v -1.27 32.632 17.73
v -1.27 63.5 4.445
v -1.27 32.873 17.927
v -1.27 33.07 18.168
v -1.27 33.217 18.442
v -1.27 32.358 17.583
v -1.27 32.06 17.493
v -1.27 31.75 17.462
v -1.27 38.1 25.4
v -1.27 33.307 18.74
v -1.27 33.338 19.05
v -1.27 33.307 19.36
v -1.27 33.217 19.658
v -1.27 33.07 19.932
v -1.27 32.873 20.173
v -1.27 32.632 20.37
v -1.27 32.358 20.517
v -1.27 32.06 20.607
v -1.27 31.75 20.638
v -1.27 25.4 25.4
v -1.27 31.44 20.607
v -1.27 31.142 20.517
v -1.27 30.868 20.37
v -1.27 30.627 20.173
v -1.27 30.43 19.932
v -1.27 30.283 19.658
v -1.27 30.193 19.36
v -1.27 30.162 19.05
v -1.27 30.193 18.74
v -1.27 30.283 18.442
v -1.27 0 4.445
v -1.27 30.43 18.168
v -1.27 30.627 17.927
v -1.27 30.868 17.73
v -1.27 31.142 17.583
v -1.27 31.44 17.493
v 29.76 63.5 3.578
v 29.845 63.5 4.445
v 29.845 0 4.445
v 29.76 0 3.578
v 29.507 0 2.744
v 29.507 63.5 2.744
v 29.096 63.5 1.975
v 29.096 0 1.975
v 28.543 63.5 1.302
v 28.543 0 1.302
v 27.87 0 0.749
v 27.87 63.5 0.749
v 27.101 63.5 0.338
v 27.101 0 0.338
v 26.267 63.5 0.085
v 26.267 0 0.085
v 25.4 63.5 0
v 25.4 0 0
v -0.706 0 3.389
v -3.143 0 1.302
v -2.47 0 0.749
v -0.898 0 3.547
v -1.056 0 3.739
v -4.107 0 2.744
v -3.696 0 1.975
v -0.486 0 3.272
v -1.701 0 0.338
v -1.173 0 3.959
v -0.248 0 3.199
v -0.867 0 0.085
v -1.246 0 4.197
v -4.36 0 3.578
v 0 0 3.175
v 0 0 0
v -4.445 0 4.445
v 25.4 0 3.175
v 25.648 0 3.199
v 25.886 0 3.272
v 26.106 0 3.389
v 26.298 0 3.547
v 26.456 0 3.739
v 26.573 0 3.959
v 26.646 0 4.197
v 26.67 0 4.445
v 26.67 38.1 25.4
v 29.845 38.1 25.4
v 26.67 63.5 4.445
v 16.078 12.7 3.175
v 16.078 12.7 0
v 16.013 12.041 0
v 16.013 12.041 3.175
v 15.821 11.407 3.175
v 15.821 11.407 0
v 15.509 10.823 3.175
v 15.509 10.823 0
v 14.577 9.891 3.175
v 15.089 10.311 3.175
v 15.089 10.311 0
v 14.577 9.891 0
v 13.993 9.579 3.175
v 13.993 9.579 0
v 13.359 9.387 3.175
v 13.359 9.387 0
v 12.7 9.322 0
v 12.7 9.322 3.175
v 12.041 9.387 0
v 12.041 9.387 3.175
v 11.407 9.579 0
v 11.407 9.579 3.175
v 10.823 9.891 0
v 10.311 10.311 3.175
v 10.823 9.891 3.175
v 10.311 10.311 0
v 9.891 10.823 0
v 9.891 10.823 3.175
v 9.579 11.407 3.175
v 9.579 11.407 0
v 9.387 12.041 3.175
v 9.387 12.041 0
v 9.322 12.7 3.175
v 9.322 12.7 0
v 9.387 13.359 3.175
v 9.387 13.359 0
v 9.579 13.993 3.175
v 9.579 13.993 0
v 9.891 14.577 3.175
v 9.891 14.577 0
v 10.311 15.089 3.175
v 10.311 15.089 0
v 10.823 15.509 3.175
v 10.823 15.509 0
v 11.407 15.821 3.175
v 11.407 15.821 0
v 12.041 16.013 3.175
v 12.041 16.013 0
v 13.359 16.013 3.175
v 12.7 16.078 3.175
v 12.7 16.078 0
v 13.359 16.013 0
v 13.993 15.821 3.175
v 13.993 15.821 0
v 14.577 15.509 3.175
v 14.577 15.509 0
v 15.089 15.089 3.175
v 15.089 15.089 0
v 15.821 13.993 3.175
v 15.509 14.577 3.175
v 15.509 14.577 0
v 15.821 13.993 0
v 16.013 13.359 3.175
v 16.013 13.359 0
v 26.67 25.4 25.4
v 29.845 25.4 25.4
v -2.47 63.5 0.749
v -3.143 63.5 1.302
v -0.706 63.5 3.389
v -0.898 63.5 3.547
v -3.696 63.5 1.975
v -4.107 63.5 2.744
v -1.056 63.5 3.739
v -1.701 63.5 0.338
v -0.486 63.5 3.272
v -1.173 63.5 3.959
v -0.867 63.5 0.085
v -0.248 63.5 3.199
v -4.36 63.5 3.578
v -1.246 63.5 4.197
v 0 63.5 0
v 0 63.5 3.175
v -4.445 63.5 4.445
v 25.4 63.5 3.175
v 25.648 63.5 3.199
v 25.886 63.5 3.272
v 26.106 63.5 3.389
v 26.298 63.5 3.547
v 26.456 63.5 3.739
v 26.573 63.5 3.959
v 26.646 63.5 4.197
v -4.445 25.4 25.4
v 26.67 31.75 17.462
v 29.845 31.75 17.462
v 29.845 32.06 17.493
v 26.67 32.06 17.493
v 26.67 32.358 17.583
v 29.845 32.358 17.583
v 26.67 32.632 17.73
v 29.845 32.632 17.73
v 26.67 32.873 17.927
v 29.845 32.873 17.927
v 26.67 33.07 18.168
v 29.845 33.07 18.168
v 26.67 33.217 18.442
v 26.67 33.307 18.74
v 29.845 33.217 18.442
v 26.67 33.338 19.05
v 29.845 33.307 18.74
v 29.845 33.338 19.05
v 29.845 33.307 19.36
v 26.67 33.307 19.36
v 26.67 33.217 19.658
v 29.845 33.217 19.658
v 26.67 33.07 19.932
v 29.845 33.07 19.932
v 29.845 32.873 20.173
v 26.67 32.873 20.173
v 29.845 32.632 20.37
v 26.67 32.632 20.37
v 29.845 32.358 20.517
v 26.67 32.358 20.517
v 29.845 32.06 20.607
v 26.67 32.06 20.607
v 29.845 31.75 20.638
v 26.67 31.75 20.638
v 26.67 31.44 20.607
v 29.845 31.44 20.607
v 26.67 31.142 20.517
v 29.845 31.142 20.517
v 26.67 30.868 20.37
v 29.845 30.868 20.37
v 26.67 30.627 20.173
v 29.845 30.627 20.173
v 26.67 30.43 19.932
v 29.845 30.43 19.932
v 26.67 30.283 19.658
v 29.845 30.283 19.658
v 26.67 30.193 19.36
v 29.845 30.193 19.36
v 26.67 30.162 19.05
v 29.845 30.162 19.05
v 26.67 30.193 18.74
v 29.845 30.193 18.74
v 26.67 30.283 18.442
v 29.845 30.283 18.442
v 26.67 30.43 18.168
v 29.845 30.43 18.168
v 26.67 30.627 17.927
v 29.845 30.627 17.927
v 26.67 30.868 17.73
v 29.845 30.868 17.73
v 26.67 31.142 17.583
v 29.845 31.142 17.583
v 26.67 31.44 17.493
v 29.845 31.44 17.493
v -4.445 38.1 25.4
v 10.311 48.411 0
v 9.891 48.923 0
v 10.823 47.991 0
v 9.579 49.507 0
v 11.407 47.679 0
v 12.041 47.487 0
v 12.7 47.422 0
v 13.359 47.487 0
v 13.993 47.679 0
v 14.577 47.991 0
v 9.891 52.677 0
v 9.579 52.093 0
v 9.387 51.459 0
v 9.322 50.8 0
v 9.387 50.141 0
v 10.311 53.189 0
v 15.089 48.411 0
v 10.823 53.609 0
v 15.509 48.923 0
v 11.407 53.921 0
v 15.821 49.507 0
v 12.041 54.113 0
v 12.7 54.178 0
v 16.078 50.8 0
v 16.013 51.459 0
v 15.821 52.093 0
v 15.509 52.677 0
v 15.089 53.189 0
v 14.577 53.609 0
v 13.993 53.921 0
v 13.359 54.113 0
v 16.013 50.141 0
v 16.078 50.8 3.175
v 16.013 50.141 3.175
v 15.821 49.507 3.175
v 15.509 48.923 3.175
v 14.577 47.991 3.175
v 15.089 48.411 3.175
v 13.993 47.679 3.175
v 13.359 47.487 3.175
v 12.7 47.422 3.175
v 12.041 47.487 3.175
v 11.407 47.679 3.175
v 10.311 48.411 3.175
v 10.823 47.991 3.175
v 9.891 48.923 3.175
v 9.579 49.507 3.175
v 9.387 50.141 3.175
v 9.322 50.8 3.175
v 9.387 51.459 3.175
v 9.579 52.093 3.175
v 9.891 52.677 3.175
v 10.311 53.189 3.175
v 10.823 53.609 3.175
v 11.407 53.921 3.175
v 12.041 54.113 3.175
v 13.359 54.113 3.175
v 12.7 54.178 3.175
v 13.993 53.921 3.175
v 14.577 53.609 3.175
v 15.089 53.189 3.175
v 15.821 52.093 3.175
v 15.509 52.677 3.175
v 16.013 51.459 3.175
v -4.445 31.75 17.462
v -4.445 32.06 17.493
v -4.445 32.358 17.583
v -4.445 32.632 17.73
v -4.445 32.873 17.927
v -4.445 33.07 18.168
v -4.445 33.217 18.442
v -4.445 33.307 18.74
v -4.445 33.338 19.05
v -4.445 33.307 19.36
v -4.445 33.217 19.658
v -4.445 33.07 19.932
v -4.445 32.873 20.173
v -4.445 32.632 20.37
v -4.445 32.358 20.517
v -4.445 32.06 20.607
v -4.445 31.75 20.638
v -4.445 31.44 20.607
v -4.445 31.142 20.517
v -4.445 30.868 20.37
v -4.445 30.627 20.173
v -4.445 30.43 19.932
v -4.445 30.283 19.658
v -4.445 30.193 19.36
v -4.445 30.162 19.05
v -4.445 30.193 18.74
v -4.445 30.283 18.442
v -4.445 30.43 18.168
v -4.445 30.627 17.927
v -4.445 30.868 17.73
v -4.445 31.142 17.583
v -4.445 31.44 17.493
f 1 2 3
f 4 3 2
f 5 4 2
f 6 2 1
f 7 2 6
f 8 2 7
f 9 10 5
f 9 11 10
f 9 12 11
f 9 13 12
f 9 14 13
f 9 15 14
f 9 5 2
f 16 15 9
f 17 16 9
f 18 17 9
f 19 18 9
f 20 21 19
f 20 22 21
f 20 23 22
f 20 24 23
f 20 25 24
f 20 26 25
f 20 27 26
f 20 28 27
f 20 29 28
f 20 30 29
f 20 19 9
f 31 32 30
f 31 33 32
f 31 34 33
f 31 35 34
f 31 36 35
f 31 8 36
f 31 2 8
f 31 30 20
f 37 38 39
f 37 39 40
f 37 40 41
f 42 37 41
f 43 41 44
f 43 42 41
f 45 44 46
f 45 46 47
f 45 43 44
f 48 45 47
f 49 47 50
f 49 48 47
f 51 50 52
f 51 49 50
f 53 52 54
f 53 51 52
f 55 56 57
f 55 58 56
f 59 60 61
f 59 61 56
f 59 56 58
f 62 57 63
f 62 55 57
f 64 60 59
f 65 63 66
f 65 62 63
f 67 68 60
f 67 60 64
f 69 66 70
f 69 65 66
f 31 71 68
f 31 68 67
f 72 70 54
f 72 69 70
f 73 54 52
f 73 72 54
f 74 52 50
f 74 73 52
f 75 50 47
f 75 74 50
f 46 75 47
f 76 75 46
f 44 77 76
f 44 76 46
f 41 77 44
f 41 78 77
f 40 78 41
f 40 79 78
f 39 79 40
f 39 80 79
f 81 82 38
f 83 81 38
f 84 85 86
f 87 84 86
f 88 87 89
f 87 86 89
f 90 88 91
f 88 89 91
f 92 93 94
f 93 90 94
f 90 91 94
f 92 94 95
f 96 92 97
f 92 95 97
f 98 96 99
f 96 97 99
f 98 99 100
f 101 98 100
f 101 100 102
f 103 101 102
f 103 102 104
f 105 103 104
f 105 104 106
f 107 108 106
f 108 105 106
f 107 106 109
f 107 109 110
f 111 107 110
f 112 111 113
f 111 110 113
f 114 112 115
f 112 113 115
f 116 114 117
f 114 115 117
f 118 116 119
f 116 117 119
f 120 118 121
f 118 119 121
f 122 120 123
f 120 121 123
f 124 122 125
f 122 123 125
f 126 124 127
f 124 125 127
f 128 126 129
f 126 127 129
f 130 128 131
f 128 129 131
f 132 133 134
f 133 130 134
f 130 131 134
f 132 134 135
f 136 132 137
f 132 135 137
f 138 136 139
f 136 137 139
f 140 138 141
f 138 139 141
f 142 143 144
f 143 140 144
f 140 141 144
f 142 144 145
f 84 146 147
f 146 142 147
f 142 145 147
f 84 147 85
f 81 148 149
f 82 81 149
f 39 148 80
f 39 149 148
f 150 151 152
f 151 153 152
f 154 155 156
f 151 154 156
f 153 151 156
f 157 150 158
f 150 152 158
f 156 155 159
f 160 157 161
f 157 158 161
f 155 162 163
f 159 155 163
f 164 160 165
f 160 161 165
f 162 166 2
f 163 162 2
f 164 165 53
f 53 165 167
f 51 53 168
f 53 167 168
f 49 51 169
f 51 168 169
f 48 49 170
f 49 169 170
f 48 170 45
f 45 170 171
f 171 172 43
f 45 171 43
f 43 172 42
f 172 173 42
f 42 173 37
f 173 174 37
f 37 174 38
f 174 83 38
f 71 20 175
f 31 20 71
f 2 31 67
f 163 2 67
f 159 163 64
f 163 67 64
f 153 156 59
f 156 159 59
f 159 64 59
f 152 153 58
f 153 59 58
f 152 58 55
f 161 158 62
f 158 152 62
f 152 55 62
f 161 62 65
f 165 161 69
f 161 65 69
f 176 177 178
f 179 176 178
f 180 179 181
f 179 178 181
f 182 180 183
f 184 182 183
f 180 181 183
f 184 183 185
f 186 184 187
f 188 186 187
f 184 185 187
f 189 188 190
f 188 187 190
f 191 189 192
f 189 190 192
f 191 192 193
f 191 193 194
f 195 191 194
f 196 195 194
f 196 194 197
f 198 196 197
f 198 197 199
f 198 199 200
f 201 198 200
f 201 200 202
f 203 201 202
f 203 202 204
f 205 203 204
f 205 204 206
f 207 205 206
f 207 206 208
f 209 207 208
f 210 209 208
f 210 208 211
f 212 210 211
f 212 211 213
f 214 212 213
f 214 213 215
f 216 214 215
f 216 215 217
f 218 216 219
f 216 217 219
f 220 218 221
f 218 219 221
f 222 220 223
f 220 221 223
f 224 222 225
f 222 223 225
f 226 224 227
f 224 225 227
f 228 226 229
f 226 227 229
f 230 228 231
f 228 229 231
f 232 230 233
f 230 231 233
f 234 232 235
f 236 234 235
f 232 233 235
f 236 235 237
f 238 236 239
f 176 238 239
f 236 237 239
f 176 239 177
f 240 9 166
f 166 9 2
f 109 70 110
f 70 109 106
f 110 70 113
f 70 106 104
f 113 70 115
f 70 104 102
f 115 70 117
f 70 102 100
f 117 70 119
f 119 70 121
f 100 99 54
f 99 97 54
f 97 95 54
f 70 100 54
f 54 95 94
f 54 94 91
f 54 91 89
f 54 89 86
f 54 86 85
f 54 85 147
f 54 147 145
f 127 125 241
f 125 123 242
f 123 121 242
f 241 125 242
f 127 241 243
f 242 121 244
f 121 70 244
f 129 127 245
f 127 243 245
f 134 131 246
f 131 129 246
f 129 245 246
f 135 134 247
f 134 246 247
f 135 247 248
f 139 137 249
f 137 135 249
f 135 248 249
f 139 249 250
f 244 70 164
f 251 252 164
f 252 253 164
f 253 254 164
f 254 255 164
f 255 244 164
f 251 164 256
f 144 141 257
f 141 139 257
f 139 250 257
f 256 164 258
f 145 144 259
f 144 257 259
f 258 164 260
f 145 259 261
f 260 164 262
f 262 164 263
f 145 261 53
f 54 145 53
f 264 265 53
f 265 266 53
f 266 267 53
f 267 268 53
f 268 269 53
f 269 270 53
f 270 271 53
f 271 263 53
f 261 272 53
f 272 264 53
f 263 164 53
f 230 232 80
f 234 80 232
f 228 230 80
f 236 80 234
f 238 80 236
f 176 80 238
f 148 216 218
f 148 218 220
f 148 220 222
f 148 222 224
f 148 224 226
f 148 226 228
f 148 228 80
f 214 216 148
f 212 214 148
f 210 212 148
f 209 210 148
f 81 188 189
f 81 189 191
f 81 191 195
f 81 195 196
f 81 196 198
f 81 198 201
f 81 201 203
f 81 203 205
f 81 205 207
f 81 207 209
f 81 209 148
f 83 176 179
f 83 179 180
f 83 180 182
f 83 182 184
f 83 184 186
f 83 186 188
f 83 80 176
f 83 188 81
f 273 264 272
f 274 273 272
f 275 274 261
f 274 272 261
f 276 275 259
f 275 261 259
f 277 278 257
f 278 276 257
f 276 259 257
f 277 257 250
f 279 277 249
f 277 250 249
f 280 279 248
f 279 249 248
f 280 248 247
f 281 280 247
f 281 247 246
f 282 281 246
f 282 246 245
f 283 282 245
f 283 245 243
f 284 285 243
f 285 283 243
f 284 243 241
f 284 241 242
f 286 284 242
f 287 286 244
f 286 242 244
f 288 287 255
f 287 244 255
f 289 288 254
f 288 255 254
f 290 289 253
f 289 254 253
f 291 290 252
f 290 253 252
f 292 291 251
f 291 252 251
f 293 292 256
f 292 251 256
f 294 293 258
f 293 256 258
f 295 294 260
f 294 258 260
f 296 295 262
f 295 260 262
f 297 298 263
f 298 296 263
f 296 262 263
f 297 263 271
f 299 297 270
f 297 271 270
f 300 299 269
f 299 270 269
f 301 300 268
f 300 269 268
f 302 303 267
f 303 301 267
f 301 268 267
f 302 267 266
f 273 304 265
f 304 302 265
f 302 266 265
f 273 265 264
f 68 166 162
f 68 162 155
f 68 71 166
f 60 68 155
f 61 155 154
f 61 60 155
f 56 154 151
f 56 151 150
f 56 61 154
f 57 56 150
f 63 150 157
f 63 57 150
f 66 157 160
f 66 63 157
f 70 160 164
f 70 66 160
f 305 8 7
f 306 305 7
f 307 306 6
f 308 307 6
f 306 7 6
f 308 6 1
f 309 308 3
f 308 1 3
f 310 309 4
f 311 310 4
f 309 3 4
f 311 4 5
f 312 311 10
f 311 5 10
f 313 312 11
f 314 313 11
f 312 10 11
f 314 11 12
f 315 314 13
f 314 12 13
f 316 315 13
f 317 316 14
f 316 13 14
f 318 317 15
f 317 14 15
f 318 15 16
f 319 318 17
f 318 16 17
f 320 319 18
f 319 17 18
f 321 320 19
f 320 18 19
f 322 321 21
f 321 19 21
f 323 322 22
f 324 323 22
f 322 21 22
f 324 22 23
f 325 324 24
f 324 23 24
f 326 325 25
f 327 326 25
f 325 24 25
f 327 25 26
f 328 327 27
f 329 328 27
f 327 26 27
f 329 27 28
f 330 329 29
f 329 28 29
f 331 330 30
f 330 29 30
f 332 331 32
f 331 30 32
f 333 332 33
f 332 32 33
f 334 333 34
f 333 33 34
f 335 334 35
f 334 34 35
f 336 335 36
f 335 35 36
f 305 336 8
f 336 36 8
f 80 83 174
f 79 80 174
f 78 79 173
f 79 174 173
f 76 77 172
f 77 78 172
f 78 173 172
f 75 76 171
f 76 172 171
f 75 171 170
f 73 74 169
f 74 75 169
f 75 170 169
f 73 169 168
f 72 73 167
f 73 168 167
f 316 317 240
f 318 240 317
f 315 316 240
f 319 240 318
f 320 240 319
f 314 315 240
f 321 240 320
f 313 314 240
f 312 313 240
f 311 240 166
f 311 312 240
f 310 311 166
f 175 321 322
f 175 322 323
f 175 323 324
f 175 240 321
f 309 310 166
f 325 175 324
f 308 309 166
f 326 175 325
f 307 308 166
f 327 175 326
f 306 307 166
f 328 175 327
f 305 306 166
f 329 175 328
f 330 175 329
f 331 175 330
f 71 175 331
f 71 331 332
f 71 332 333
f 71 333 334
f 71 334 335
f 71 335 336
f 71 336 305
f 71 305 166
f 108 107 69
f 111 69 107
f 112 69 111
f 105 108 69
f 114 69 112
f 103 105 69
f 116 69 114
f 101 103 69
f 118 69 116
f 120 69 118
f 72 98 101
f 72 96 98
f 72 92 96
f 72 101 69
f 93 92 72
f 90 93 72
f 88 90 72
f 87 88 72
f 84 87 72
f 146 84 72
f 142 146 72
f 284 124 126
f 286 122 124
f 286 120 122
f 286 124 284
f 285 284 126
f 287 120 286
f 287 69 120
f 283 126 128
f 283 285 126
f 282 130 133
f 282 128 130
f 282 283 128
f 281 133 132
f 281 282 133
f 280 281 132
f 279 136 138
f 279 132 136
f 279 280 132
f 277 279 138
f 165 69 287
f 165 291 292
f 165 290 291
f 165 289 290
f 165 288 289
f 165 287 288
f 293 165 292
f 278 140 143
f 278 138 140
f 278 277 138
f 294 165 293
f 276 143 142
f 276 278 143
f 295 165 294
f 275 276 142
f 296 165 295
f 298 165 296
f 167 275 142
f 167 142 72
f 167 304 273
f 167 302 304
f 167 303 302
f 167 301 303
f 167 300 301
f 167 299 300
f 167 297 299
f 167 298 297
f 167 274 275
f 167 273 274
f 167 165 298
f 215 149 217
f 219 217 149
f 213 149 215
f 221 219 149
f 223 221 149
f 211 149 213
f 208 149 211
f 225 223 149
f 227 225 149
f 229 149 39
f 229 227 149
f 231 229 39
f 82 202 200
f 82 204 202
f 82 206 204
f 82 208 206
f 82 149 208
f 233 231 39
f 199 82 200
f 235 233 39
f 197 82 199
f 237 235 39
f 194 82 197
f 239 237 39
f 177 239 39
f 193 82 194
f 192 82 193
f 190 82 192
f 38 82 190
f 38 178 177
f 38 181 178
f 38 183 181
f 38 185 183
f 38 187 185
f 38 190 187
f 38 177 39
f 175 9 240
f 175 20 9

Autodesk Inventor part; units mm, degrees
ref_plane "YZ Plane" through (0, 0, 0) normal (1, 0, 0) x (0, 1, 0)
ref_plane "XZ Plane" through (0, 0, 0) normal (0, 1, 0) x (-1, 0, 0)
ref_plane "XY Plane" through (0, 0, 0) normal (0, 0, 1) x (1, 0, 0)
sketch "Sketch1" plane through (0, 0, 0) normal (0, 0, 1) x (1, 0, 0)
  line L0 (0, 0) -> (25.4, 0)
  line L1 (25.4, 0) -> (25.4, 63.5)
  line L2 (25.4, 63.5) -> (0, 63.5)
  line L3 (0, 63.5) -> (0, 0)
  circle A0 centre (12.7, 50.8) radius 3.3782
  circle A1 centre (12.7, 12.7) radius 3.3782
  dimension "d0" = 25.4
  dimension "d1" = 63.5
  dimension "d2" = 6.7564
  dimension "d3" = 6.7564
  dimension "d4" = 12.7
  dimension "d5" = 12.7
  dimension "d6" = 12.7
  dimension "d7" = 12.7
extrude "Plate1" add sketch "Sketch1" along normal blind 3.175
sketch "Sketch2" plane through (26.67, 63.5, 4.445) normal (1, 0, 0) x (0, 1, 0)
  line L0 (-63.5, 0) -> (0, 0)
  line L1 (0, 0) -> (0, 20.955)
  line L2 (0, 20.955) -> (-63.5, 20.955)
  line L3 (-63.5, 20.955) -> (-63.5, 0)
edge flange "Flange1" height 25.4 angle 90 thickness 3.175 bend radius 1.27 thickness toward (1, 0, 0) relief tear relief width 3.175 relief depth 1.5875 edges at (25.4, 31.75, 3.175) wall of the first edge with corners at (26.67, 0, 4.445) (26.67, 63.5, 4.445) (26.67, 63.5, 25.4) (26.67, 0, 25.4)
bend "Bend1"
corner "Corner1"
sketch "Sketch3" plane through (29.845, 0, 25.4) normal (1, 0, 0) x (0, 0, -1)
  line L0 (0, 63.5) -> (20.955, 63.5) projected
  line L1 (0, 0) -> (0, 63.5) projected
  line L2 (20.955, 0) -> (0, 0) projected
  circle A0 centre (6.35, 31.75) radius 1.5875
  line L3 (0, 38.1) -> (20.955, 63.5)
  line L4 (0, 25.4) -> (20.955, 0)
  point P0 (25.4, 0)
  dimension "d19" = 3.175
  dimension "d20" = 6.35
  dimension "d21" = 31.75
  dimension "d22" = 12.7
  dimension "d23" = 25.4
sketch "Sketch4" plane through (-1.27, 0, 4.445) normal (-1, 0, 0) x (0, -1, 0)
  line L0 (-63.5, 0) -> (0, 0)
  line L1 (0, 0) -> (0, 20.955)
  line L2 (0, 20.955) -> (-63.5, 20.955)
  line L3 (-63.5, 20.955) -> (-63.5, 0)
edge flange "Flange2" height 25.4 angle 90 thickness 3.175 bend radius 1.27 thickness toward (-1, 0, 0) relief tear relief width 3.175 relief depth 1.5875 edges at (0, 31.75, 3.175) wall of the first edge with corners at (-1.27, 63.5, 4.445) (-1.27, 0, 4.445) (-1.27, 0, 25.4) (-1.27, 63.5, 25.4)
bend "Bend2"
corner "Corner2"
extrude "Extrusion1" cut sketch "Sketch3" against normal blind 76.2
equation "\"d9\" = BendReliefWidth"
equation "\"d10\" = BendReliefDepth"
equation "\"d11\" = MinimumRemnant"
equation "\"d12\" = BendRadius"
equation "\"d16\" = CornerReliefSize"
equation "\"d17\" = GapSize"
equation "\"d18\" = JacobiRadiusSize"
equation "\"d26\" = BendReliefWidth"
equation "\"d27\" = BendReliefDepth"
equation "\"d28\" = MinimumRemnant"
equation "\"d29\" = BendRadius"
equation "\"d33\" = CornerReliefSize"
equation "\"d34\" = GapSize"
equation "\"d35\" = JacobiRadiusSize"
equation "\"BendRadius\" = Thickness"
equation "\"BendReliefWidth\" = Thickness"
equation "\"BendReliefDepth\" = 0.5 * Thickness"
equation "\"CornerReliefSize\" = 4 * Thickness"
equation "\"MinimumRemnant\" = 2 * Thickness"
equation "\"TransitionRadius\" = BendRadius"
equation "\"JacobiRadiusSize\" = BendRadius"
equation "\"GapSize\" = Thickness"
equation "\"d8\" = BendRadius"
equation "\"Thickness\" = 3.175"
properties part number "BackPistonHinge-Tower"
